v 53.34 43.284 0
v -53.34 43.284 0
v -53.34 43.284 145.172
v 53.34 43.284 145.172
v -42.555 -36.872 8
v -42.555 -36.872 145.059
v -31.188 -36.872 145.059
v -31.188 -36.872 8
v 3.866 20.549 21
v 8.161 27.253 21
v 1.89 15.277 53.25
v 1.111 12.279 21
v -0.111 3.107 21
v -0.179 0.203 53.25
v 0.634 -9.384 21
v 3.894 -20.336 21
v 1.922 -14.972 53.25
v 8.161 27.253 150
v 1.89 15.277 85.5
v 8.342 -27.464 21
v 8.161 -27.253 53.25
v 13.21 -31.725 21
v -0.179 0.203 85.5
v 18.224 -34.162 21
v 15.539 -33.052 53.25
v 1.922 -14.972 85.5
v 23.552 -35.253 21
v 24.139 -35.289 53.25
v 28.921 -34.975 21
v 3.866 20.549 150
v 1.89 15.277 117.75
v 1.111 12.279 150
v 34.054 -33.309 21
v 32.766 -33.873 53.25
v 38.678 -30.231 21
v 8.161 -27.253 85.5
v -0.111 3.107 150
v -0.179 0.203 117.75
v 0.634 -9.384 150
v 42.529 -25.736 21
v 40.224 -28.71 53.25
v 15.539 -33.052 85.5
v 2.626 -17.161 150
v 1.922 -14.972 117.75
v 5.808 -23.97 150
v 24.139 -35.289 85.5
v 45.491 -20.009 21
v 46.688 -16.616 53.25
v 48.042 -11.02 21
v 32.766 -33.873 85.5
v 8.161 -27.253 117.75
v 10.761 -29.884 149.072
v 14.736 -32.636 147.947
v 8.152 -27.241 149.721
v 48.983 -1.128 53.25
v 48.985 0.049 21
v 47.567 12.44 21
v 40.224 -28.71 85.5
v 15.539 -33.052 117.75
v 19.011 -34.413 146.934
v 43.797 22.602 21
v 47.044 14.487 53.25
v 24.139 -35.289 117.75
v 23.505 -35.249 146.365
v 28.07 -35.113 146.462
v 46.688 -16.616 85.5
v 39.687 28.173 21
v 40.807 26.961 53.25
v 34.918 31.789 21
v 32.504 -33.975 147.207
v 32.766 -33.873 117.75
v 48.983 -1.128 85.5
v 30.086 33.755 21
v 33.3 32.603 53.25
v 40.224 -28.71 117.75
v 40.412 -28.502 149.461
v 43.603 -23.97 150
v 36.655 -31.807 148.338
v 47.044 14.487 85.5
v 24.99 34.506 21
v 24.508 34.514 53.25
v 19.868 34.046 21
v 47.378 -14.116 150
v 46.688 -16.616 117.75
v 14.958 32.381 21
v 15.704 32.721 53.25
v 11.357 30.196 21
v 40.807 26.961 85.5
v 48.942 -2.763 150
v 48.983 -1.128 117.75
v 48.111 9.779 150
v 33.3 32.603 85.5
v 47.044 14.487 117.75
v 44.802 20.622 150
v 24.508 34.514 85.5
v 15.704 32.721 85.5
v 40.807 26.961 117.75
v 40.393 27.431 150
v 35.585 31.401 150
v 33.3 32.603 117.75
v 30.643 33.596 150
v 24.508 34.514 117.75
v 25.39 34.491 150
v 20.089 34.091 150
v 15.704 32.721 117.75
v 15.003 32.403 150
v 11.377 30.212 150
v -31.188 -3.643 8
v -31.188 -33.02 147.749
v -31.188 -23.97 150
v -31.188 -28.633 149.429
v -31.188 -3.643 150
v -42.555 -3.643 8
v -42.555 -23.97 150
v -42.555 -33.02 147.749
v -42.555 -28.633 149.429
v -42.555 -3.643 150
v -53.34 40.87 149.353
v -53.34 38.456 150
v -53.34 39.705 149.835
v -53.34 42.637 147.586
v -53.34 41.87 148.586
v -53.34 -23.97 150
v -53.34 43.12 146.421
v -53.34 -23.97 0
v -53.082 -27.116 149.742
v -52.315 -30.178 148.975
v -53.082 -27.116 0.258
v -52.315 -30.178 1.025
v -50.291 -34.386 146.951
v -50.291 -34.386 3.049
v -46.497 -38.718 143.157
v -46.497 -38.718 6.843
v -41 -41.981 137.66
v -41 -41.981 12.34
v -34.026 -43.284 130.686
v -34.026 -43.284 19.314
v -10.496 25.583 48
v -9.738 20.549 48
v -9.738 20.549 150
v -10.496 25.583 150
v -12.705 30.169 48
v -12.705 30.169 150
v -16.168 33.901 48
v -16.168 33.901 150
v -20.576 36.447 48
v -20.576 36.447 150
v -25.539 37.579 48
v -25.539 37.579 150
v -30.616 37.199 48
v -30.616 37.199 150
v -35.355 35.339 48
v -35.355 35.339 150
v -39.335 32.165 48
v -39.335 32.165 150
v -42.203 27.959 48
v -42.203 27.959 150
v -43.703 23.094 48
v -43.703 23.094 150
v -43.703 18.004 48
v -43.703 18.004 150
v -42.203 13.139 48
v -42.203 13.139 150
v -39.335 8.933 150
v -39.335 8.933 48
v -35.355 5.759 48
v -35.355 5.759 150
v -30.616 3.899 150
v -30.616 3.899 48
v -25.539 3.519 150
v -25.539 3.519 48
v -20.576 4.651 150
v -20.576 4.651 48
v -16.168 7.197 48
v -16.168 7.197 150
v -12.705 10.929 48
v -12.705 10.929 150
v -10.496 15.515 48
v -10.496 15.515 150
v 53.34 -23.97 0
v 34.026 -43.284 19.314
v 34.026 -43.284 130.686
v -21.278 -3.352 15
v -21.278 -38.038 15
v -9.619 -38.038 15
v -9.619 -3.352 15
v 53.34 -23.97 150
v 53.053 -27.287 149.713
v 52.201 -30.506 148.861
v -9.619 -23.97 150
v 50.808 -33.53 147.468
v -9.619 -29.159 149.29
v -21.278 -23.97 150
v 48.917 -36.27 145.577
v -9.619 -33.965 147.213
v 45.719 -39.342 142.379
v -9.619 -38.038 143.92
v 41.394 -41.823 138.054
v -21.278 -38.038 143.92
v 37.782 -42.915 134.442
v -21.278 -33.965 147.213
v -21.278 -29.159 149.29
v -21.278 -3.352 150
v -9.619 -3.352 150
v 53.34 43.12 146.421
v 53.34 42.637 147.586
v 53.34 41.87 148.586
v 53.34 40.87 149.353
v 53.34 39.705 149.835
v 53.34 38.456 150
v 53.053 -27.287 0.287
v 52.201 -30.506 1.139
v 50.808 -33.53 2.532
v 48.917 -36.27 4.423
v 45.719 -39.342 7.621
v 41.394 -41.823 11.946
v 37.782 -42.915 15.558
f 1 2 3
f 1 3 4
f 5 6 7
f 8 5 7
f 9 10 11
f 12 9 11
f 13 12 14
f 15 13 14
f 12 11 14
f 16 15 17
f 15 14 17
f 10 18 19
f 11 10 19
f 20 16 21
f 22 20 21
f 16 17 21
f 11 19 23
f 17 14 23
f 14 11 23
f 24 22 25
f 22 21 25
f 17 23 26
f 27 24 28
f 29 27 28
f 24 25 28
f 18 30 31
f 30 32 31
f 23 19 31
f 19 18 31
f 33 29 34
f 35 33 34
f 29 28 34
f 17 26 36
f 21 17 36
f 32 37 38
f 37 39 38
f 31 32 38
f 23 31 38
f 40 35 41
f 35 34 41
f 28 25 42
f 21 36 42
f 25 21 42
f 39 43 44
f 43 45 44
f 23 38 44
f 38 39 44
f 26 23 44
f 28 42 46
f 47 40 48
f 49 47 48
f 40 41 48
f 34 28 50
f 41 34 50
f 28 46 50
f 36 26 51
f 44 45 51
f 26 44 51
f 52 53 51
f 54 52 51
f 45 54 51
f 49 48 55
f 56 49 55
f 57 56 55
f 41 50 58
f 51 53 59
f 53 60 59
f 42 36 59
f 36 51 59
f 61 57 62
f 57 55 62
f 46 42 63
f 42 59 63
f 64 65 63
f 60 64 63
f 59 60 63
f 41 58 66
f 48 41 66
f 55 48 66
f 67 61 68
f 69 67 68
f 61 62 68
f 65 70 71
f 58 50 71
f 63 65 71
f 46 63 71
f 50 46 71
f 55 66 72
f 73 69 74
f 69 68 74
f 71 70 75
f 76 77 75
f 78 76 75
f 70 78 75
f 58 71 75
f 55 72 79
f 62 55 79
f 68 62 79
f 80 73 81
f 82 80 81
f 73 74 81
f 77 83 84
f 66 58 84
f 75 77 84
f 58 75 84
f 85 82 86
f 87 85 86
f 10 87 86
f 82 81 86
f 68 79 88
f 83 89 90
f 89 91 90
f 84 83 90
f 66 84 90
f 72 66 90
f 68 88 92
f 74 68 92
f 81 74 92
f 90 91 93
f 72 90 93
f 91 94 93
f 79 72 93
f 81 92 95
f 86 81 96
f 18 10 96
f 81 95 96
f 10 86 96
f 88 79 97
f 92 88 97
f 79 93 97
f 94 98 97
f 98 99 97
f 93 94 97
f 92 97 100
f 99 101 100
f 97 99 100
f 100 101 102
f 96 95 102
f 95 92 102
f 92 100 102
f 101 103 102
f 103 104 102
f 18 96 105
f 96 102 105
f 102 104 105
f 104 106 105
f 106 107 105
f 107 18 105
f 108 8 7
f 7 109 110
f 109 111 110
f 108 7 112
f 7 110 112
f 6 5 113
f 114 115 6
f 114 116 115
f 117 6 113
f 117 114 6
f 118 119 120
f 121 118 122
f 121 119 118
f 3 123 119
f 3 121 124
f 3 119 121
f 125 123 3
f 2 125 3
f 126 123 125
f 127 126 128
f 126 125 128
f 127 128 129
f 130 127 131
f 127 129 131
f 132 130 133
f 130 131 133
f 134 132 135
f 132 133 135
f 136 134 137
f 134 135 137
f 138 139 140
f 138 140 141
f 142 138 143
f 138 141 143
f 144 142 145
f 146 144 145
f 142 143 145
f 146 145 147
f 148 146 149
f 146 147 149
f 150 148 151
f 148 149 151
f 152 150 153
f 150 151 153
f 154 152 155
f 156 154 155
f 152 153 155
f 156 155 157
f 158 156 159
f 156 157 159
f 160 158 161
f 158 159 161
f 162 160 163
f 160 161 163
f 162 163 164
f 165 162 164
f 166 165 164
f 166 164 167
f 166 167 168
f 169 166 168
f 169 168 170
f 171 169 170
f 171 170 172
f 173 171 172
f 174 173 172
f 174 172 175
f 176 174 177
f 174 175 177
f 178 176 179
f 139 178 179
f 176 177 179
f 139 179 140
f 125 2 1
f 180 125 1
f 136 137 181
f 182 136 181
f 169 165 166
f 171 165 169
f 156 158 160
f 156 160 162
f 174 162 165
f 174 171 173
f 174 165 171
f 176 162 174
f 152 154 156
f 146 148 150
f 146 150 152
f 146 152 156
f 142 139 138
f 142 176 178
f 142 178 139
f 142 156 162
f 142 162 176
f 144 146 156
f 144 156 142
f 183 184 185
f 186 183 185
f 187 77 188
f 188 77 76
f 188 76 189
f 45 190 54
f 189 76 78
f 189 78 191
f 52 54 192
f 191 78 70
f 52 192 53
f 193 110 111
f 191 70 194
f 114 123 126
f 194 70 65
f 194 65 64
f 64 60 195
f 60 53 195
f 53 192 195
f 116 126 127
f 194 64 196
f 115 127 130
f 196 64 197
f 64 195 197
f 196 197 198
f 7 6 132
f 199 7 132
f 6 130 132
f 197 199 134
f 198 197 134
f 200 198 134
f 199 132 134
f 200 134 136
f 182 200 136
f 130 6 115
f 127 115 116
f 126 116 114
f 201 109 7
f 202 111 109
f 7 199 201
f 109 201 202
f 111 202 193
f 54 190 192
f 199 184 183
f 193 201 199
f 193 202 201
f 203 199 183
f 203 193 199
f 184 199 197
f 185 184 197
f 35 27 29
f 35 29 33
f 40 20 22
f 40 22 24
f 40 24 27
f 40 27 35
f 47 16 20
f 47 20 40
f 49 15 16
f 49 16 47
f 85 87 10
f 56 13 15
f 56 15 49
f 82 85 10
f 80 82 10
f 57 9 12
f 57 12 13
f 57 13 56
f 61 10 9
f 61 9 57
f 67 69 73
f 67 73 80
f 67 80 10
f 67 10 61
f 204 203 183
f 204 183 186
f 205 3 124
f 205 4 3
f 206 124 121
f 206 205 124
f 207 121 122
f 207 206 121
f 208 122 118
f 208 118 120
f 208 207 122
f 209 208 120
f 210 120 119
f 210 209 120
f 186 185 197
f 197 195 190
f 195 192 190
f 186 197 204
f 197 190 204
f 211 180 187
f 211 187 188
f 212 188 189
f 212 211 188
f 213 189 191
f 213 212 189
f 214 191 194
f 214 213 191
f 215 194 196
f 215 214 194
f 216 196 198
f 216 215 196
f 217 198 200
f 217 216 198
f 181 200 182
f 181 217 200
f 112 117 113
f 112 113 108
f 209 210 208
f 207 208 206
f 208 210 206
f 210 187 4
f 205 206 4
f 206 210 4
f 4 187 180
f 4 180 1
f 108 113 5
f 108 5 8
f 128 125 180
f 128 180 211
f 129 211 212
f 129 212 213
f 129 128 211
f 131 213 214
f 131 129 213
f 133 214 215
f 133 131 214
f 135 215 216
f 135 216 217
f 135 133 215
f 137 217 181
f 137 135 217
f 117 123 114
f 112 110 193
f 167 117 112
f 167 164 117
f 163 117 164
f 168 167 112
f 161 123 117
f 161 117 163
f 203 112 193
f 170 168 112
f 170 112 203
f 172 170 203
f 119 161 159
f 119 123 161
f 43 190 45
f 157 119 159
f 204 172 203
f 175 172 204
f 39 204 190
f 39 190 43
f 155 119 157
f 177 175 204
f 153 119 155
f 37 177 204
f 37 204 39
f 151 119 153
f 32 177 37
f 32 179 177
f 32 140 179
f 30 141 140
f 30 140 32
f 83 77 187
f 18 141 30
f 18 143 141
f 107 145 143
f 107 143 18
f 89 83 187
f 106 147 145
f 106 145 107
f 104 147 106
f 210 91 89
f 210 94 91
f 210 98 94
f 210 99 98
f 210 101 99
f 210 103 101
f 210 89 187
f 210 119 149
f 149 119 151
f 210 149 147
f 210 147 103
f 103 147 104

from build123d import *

# Parameters (mm, degrees)
F0_W         = 106.6799983382
F0_H         = 86.5681990981
F1_DEPTH     = 150
F6_DEPTH     = 129
F2_R         = 17.0780712093
F7_DEPTH     = 102
F5_W         = 11.6590159014
F5_H         = 34.6855749376
F8_DEPTH     = 135
F4_W         = 11.3675408065
F4_H         = 33.2281992305
F9_DEPTH     = 142
F10_T1_DEPTH = 246.5685424949
F10_T3_DEPTH = 203.2485408331
F11_R        = 4.8284271247


# Not quite as in the source:
# - a fillet or chamfer that OpenCascade refuses, or shapes differently, is made with other operations: its cross-section is extruded or revolved along the edge and cut away or added


with BuildPart() as f1:
    # F0 (on Top) → F1 (new body)
    with BuildSketch(Plane.XY):
        Rectangle(F0_W, F0_H)
    extrude(amount=F1_DEPTH)

    # F3 (on face) → F6 (cut)
    with BuildSketch(Plane.XY.offset(150)):
        with BuildLine():
            add(Edge.make_bspline(
                [(8.1613119692, 27.2529497743), (-3.0147443048, 14.6805512394), (-2.8175450086, -36.252327606), (51.2687127956, -39.2094789539), (52.3450533609, 36.9814095435), (16.8107014154, 36.9829984189), (8.1613119692, 27.2529497743)],
                knots=[0, 0, 0, 0, 0.2815356024, 0.4975750124, 0.7821135642, 1, 1, 1, 1], degree=3))
        make_face()
    extrude(amount=-F6_DEPTH, mode=Mode.SUBTRACT)

    # F2 (on face) → F7 (cut)
    with BuildSketch(Plane.XY.offset(150)):
        with Locations((-26.815738529, 20.5490160733)):
            Circle(F2_R)
    extrude(amount=-F7_DEPTH, mode=Mode.SUBTRACT)

    # F5 (on face) → F8 (cut)
    with BuildSketch(Plane.XY.offset(150)):
        with Locations((-15.4481972568, -20.6947547849)):
            Rectangle(F5_W, F5_H)
    extrude(amount=-F8_DEPTH, mode=Mode.SUBTRACT)

    # F4 (on face) → F9 (cut)
    with BuildSketch(Plane.XY.offset(150)):
        with Locations((-36.8716400117, -20.2575422591)):
            Rectangle(F4_W, F4_H)
    extrude(amount=-F9_DEPTH, mode=Mode.SUBTRACT)

    # F10: fillet of radius 19.313708499 on 4 edges, made by hand

    # F10_s2 → F10_t1 (cut)
    with BuildSketch(Plane.XY.offset(-48.2842712475)):
        with BuildLine():
            ThreePointArc((-53.3399991691, -23.9703910501), (-47.6831449196, -37.6272452996), (-34.0262906701, -43.2840995491))
            Line((-34.0262906701, -43.2840995491), (-53.3399991691, -43.2840995491))
            Line((-53.3399991691, -43.2840995491), (-53.3399991691, -23.9703910501))
        make_face()
        with BuildLine():
            ThreePointArc((53.3399991691, -23.9703910501), (47.6831449196, -37.6272452996), (34.0262906701, -43.2840995491))
            Line((34.0262906701, -43.2840995491), (53.3399991691, -43.2840995491))
            Line((53.3399991691, -43.2840995491), (53.3399991691, -23.9703910501))
        make_face()
    extrude(amount=F10_T1_DEPTH, mode=Mode.SUBTRACT)

    # F10_s4 → F10_t3 (cut)
    with BuildSketch(Plane.YZ.offset(-101.6242704166)):
        with BuildLine():
            ThreePointArc((-23.9703910501, 0), (-37.6272452996, 5.6568542495), (-43.2840995491, 19.313708499))
            Line((-43.2840995491, 19.313708499), (-43.2840995491, 0))
            Line((-43.2840995491, 0), (-23.9703910501, 0))
        make_face()
        with BuildLine():
            ThreePointArc((-23.9703910501, 150), (-37.6272452996, 144.3431457505), (-43.2840995491, 130.686291501))
            Line((-43.2840995491, 130.686291501), (-43.2840995491, 150))
            Line((-43.2840995491, 150), (-23.9703910501, 150))
        make_face()
    extrude(amount=F10_T3_DEPTH, mode=Mode.SUBTRACT)

    # F11
    f11_edges = [f1.edges().sort_by_distance(p)[0] for p in [
        (0, 43.2841, 150),
    ]]
    fillet(f11_edges, radius=F11_R)


solid = f1.part
